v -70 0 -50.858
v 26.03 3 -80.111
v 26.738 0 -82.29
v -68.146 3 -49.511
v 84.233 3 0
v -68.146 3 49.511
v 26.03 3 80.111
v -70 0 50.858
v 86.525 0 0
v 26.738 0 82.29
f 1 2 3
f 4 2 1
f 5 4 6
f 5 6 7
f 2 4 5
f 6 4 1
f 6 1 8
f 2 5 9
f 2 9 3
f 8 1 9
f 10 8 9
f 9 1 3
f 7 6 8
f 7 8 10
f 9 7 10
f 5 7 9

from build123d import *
from OCP.BRepFilletAPI import BRepFilletAPI_MakeChamfer

# Parameters (mm, degrees)
BOSS_EXTRUDE1_DEPTH = 3
CHAMFER1_SIZE       = 3
CHAMFER1_SIZE_2     = 1.853922924


with BuildPart() as part:
    # Sketch1 → Boss-Extrude1 (new body)
    with BuildSketch(Plane(origin=(0, 0, 0), x_dir=(1, 0, 0), z_dir=(0, 1, 0))):
        Polygon((86.524758425, 0), (26.737620788, 82.289935321), (-70, 50.85797696), (-70, -50.85797696), (26.737620788, -82.289935321), align=None)
    extrude(amount=BOSS_EXTRUDE1_DEPTH)

    # Chamfer1
    chamfer1_edges_1 = [part.edges().sort_by_distance(p)[0] for p in [
        (-70, 3, 0),
    ]]
    chamfer1_side_1 = [part.faces().sort_by_distance(p)[0] for p in [
        (-70, 2.962921542, 0),
    ]]
    chamfer1_edges_2 = [part.edges().sort_by_distance(p)[0] for p in [
        (-21.631189606, 3, -66.573956141),
    ]]
    chamfer1_side_2 = [part.faces().sort_by_distance(p)[0] for p in [
        (-21.631189606, 2.962921542, -66.573956141),
    ]]
    chamfer1_edges_3 = [part.edges().sort_by_distance(p)[0] for p in [
        (56.631189606, 3, -41.14496766),
    ]]
    chamfer1_side_3 = [part.faces().sort_by_distance(p)[0] for p in [
        (56.631189606, 2.962921542, -41.14496766),
    ]]
    chamfer1_edges_4 = [part.edges().sort_by_distance(p)[0] for p in [
        (56.631189606, 3, 41.14496766),
    ]]
    chamfer1_side_4 = [part.faces().sort_by_distance(p)[0] for p in [
        (56.631189606, 2.962921542, 41.14496766),
    ]]
    chamfer1_edges_5 = [part.edges().sort_by_distance(p)[0] for p in [
        (-21.631189606, 3, 66.573956141),
    ]]
    chamfer1_side_5 = [part.faces().sort_by_distance(p)[0] for p in [
        (-21.631189606, 2.962921542, 66.573956141),
    ]]
    chamfer1 = BRepFilletAPI_MakeChamfer(part.part.solid().wrapped)
    for e in chamfer1_edges_1:
        chamfer1.Add(CHAMFER1_SIZE - 0.0001, CHAMFER1_SIZE_2 - 0.0001, e.wrapped, chamfer1_side_1[0].wrapped)
    for e in chamfer1_edges_2:
        chamfer1.Add(CHAMFER1_SIZE - 0.0001, CHAMFER1_SIZE_2 - 0.0001, e.wrapped, chamfer1_side_2[0].wrapped)
    for e in chamfer1_edges_3:
        chamfer1.Add(CHAMFER1_SIZE - 0.0001, CHAMFER1_SIZE_2 - 0.0001, e.wrapped, chamfer1_side_3[0].wrapped)
    for e in chamfer1_edges_4:
        chamfer1.Add(CHAMFER1_SIZE - 0.0001, CHAMFER1_SIZE_2 - 0.0001, e.wrapped, chamfer1_side_4[0].wrapped)
    for e in chamfer1_edges_5:
        chamfer1.Add(CHAMFER1_SIZE - 0.0001, CHAMFER1_SIZE_2 - 0.0001, e.wrapped, chamfer1_side_5[0].wrapped)
    add(Compound.cast(chamfer1.Shape()), mode=Mode.REPLACE)  # a hair under: the kernel refuses the full size


solid = part.part
